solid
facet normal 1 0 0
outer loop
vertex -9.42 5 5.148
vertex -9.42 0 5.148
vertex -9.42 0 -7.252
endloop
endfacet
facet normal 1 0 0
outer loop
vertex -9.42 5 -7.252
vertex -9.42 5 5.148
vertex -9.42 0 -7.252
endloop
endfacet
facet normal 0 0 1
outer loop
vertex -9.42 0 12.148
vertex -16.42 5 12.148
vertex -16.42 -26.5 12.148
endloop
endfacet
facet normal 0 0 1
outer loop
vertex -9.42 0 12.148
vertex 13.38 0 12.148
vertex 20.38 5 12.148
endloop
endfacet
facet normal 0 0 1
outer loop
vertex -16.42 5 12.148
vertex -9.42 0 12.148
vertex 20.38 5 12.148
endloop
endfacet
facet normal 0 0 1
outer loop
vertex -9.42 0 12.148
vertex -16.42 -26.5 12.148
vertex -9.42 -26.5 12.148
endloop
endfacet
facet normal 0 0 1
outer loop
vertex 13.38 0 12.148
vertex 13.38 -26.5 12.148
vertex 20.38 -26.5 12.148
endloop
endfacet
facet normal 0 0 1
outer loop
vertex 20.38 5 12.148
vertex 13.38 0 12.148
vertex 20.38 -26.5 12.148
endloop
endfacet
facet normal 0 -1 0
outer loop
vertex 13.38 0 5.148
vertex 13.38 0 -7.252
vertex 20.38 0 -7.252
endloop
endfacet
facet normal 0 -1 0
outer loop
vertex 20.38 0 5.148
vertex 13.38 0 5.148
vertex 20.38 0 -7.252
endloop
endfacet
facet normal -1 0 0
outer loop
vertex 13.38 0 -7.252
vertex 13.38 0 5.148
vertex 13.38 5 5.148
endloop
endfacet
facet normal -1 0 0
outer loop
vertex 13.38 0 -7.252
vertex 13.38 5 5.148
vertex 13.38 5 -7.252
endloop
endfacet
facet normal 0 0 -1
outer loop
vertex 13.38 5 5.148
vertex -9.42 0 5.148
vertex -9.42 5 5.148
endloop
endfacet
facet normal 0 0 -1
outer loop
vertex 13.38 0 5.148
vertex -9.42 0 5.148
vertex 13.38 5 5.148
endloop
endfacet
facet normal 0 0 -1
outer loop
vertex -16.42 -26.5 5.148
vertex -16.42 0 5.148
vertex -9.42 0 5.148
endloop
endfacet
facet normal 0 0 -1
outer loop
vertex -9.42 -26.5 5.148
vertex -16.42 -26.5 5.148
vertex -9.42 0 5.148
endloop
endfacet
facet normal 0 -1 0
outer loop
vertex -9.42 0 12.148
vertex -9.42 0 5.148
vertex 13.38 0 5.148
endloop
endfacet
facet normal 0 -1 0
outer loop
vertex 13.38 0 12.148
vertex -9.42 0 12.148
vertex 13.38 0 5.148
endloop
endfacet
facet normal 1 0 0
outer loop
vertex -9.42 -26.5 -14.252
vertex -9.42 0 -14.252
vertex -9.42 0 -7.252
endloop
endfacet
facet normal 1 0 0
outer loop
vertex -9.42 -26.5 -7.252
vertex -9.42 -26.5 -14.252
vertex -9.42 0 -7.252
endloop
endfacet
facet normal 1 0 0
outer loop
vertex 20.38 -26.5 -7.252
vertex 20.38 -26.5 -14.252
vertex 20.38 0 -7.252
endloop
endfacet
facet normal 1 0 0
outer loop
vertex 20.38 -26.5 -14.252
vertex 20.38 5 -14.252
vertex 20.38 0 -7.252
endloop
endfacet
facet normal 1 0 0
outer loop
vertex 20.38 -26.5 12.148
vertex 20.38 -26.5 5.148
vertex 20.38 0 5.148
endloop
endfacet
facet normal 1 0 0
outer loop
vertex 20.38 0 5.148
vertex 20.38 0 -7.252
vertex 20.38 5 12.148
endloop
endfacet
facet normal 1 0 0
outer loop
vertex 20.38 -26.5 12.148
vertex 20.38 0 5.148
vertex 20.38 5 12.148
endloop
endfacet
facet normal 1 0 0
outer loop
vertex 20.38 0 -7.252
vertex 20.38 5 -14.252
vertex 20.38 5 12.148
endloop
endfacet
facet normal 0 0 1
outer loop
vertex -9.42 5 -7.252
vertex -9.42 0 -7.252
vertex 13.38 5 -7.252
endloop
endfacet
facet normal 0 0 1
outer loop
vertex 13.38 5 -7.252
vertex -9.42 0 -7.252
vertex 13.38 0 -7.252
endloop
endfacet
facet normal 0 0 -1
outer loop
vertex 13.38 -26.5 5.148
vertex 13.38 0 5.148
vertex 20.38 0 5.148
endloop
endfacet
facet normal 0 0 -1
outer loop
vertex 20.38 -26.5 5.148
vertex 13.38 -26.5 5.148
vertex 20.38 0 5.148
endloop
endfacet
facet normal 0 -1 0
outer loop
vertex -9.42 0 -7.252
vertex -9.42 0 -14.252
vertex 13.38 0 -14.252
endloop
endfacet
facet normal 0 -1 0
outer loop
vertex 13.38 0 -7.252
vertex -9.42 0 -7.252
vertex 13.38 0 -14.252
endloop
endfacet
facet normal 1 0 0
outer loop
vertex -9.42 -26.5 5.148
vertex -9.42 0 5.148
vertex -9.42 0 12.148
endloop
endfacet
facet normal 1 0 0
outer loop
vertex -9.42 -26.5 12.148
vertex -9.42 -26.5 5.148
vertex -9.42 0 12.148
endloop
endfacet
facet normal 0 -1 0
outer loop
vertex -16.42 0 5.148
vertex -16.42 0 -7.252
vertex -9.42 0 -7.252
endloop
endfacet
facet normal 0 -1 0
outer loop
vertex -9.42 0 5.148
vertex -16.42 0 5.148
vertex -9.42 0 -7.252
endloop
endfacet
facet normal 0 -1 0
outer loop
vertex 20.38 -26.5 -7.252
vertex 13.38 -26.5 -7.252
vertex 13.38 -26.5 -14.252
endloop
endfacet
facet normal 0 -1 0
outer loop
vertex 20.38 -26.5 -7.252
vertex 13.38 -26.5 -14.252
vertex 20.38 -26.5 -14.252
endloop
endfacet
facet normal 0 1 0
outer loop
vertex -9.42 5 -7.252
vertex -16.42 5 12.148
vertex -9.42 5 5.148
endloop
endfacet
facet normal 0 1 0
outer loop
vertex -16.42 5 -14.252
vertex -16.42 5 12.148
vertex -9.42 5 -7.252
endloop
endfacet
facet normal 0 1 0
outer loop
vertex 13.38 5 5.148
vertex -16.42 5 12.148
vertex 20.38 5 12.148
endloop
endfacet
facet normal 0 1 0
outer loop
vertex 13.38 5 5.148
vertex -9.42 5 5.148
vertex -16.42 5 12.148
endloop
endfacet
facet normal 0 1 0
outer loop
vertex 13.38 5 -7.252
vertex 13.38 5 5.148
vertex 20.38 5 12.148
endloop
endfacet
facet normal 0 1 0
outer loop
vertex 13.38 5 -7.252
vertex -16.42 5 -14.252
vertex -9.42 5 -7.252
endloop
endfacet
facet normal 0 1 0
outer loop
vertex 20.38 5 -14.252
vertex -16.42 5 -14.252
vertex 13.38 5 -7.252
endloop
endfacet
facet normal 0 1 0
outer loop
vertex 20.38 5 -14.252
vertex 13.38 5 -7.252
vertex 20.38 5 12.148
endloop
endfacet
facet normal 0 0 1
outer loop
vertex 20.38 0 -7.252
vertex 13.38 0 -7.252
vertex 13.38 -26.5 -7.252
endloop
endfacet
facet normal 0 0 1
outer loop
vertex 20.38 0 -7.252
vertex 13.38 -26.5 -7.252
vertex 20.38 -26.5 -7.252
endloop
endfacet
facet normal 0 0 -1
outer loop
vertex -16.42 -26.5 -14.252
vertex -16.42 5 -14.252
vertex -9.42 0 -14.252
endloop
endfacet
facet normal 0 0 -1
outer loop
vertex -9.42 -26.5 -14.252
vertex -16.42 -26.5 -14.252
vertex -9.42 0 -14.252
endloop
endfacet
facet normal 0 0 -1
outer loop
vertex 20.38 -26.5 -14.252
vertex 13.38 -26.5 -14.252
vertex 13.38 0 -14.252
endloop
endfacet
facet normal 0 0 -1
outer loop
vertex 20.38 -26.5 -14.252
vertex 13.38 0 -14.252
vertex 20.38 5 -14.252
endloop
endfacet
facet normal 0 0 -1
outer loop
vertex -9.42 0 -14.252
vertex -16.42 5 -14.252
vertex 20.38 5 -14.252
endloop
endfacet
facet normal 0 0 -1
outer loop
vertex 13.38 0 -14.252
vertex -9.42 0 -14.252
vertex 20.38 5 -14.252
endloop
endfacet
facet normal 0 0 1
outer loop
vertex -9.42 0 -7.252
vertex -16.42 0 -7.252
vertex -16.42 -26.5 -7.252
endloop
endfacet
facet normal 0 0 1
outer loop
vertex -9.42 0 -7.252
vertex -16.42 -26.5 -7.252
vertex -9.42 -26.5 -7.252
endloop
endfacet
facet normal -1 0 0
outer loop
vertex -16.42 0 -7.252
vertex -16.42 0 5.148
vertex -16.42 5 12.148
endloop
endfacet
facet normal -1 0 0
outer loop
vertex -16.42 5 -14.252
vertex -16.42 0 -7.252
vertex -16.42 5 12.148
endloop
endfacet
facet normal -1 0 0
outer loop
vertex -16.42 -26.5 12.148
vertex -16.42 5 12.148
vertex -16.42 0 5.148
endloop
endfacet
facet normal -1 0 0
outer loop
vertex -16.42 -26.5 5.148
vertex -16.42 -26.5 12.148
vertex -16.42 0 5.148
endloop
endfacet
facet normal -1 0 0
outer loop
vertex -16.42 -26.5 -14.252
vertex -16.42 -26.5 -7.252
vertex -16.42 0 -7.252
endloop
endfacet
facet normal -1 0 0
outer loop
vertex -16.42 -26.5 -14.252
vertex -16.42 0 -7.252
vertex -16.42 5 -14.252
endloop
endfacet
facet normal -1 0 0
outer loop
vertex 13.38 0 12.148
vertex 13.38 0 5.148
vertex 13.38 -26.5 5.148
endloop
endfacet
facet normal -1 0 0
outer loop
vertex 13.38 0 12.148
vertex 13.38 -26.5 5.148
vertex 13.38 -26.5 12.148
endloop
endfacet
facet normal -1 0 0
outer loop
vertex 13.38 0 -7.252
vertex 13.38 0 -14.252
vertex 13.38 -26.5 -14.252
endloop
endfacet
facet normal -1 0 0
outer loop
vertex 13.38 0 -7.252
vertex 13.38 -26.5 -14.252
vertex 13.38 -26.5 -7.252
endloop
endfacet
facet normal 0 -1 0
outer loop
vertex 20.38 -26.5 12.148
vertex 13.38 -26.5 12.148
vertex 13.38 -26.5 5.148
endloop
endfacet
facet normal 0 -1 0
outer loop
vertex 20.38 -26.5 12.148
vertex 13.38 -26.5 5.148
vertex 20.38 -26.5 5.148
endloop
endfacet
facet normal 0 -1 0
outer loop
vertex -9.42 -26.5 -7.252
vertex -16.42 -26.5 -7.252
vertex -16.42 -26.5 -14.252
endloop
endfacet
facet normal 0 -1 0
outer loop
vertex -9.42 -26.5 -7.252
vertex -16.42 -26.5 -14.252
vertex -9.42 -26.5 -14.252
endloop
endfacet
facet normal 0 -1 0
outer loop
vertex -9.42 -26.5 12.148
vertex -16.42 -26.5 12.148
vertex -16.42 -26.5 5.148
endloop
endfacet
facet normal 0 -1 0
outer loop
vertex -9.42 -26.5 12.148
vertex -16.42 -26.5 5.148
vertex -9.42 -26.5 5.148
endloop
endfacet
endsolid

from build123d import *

# Parameters (mm, degrees)
SKETCH1_W           = 36.8
SKETCH1_H           = 26.4
SKETCH1_W_2         = 22.8
SKETCH1_H_2         = 12.4
BOSS_EXTRUDE1_DEPTH = 5
SKETCH2_W           = 7
SKETCH2_H           = 7
BOSS_EXTRUDE2_DEPTH = 26.5


with BuildPart() as part:
    # Sketch1 → Boss-Extrude1 (new body)
    with BuildSketch(Plane(origin=(0, 0, 0), x_dir=(1, 0, 0), z_dir=(0, 1, 0))):
        with Locations((1.98028169, 1.052112676)):
            Rectangle(SKETCH1_W, SKETCH1_H)
        with Locations((1.98028169, 1.052112676)):
            Rectangle(SKETCH1_W_2, SKETCH1_H_2, mode=Mode.SUBTRACT)
    extrude(amount=BOSS_EXTRUDE1_DEPTH)

    # Sketch2 → Boss-Extrude2 (add)
    with BuildSketch(Plane.XZ):
        with Locations((16.88028169, -10.752112676)):
            Rectangle(SKETCH2_W, SKETCH2_H)
        with Locations((-12.91971831, -10.752112676)):
            Rectangle(SKETCH2_W, SKETCH2_H)
        with Locations((-12.91971831, 8.647887324)):
            Rectangle(SKETCH2_W, SKETCH2_H)
        with Locations((16.88028169, 8.647887324)):
            Rectangle(SKETCH2_W, SKETCH2_H)
    extrude(amount=BOSS_EXTRUDE2_DEPTH)


solid = part.part
